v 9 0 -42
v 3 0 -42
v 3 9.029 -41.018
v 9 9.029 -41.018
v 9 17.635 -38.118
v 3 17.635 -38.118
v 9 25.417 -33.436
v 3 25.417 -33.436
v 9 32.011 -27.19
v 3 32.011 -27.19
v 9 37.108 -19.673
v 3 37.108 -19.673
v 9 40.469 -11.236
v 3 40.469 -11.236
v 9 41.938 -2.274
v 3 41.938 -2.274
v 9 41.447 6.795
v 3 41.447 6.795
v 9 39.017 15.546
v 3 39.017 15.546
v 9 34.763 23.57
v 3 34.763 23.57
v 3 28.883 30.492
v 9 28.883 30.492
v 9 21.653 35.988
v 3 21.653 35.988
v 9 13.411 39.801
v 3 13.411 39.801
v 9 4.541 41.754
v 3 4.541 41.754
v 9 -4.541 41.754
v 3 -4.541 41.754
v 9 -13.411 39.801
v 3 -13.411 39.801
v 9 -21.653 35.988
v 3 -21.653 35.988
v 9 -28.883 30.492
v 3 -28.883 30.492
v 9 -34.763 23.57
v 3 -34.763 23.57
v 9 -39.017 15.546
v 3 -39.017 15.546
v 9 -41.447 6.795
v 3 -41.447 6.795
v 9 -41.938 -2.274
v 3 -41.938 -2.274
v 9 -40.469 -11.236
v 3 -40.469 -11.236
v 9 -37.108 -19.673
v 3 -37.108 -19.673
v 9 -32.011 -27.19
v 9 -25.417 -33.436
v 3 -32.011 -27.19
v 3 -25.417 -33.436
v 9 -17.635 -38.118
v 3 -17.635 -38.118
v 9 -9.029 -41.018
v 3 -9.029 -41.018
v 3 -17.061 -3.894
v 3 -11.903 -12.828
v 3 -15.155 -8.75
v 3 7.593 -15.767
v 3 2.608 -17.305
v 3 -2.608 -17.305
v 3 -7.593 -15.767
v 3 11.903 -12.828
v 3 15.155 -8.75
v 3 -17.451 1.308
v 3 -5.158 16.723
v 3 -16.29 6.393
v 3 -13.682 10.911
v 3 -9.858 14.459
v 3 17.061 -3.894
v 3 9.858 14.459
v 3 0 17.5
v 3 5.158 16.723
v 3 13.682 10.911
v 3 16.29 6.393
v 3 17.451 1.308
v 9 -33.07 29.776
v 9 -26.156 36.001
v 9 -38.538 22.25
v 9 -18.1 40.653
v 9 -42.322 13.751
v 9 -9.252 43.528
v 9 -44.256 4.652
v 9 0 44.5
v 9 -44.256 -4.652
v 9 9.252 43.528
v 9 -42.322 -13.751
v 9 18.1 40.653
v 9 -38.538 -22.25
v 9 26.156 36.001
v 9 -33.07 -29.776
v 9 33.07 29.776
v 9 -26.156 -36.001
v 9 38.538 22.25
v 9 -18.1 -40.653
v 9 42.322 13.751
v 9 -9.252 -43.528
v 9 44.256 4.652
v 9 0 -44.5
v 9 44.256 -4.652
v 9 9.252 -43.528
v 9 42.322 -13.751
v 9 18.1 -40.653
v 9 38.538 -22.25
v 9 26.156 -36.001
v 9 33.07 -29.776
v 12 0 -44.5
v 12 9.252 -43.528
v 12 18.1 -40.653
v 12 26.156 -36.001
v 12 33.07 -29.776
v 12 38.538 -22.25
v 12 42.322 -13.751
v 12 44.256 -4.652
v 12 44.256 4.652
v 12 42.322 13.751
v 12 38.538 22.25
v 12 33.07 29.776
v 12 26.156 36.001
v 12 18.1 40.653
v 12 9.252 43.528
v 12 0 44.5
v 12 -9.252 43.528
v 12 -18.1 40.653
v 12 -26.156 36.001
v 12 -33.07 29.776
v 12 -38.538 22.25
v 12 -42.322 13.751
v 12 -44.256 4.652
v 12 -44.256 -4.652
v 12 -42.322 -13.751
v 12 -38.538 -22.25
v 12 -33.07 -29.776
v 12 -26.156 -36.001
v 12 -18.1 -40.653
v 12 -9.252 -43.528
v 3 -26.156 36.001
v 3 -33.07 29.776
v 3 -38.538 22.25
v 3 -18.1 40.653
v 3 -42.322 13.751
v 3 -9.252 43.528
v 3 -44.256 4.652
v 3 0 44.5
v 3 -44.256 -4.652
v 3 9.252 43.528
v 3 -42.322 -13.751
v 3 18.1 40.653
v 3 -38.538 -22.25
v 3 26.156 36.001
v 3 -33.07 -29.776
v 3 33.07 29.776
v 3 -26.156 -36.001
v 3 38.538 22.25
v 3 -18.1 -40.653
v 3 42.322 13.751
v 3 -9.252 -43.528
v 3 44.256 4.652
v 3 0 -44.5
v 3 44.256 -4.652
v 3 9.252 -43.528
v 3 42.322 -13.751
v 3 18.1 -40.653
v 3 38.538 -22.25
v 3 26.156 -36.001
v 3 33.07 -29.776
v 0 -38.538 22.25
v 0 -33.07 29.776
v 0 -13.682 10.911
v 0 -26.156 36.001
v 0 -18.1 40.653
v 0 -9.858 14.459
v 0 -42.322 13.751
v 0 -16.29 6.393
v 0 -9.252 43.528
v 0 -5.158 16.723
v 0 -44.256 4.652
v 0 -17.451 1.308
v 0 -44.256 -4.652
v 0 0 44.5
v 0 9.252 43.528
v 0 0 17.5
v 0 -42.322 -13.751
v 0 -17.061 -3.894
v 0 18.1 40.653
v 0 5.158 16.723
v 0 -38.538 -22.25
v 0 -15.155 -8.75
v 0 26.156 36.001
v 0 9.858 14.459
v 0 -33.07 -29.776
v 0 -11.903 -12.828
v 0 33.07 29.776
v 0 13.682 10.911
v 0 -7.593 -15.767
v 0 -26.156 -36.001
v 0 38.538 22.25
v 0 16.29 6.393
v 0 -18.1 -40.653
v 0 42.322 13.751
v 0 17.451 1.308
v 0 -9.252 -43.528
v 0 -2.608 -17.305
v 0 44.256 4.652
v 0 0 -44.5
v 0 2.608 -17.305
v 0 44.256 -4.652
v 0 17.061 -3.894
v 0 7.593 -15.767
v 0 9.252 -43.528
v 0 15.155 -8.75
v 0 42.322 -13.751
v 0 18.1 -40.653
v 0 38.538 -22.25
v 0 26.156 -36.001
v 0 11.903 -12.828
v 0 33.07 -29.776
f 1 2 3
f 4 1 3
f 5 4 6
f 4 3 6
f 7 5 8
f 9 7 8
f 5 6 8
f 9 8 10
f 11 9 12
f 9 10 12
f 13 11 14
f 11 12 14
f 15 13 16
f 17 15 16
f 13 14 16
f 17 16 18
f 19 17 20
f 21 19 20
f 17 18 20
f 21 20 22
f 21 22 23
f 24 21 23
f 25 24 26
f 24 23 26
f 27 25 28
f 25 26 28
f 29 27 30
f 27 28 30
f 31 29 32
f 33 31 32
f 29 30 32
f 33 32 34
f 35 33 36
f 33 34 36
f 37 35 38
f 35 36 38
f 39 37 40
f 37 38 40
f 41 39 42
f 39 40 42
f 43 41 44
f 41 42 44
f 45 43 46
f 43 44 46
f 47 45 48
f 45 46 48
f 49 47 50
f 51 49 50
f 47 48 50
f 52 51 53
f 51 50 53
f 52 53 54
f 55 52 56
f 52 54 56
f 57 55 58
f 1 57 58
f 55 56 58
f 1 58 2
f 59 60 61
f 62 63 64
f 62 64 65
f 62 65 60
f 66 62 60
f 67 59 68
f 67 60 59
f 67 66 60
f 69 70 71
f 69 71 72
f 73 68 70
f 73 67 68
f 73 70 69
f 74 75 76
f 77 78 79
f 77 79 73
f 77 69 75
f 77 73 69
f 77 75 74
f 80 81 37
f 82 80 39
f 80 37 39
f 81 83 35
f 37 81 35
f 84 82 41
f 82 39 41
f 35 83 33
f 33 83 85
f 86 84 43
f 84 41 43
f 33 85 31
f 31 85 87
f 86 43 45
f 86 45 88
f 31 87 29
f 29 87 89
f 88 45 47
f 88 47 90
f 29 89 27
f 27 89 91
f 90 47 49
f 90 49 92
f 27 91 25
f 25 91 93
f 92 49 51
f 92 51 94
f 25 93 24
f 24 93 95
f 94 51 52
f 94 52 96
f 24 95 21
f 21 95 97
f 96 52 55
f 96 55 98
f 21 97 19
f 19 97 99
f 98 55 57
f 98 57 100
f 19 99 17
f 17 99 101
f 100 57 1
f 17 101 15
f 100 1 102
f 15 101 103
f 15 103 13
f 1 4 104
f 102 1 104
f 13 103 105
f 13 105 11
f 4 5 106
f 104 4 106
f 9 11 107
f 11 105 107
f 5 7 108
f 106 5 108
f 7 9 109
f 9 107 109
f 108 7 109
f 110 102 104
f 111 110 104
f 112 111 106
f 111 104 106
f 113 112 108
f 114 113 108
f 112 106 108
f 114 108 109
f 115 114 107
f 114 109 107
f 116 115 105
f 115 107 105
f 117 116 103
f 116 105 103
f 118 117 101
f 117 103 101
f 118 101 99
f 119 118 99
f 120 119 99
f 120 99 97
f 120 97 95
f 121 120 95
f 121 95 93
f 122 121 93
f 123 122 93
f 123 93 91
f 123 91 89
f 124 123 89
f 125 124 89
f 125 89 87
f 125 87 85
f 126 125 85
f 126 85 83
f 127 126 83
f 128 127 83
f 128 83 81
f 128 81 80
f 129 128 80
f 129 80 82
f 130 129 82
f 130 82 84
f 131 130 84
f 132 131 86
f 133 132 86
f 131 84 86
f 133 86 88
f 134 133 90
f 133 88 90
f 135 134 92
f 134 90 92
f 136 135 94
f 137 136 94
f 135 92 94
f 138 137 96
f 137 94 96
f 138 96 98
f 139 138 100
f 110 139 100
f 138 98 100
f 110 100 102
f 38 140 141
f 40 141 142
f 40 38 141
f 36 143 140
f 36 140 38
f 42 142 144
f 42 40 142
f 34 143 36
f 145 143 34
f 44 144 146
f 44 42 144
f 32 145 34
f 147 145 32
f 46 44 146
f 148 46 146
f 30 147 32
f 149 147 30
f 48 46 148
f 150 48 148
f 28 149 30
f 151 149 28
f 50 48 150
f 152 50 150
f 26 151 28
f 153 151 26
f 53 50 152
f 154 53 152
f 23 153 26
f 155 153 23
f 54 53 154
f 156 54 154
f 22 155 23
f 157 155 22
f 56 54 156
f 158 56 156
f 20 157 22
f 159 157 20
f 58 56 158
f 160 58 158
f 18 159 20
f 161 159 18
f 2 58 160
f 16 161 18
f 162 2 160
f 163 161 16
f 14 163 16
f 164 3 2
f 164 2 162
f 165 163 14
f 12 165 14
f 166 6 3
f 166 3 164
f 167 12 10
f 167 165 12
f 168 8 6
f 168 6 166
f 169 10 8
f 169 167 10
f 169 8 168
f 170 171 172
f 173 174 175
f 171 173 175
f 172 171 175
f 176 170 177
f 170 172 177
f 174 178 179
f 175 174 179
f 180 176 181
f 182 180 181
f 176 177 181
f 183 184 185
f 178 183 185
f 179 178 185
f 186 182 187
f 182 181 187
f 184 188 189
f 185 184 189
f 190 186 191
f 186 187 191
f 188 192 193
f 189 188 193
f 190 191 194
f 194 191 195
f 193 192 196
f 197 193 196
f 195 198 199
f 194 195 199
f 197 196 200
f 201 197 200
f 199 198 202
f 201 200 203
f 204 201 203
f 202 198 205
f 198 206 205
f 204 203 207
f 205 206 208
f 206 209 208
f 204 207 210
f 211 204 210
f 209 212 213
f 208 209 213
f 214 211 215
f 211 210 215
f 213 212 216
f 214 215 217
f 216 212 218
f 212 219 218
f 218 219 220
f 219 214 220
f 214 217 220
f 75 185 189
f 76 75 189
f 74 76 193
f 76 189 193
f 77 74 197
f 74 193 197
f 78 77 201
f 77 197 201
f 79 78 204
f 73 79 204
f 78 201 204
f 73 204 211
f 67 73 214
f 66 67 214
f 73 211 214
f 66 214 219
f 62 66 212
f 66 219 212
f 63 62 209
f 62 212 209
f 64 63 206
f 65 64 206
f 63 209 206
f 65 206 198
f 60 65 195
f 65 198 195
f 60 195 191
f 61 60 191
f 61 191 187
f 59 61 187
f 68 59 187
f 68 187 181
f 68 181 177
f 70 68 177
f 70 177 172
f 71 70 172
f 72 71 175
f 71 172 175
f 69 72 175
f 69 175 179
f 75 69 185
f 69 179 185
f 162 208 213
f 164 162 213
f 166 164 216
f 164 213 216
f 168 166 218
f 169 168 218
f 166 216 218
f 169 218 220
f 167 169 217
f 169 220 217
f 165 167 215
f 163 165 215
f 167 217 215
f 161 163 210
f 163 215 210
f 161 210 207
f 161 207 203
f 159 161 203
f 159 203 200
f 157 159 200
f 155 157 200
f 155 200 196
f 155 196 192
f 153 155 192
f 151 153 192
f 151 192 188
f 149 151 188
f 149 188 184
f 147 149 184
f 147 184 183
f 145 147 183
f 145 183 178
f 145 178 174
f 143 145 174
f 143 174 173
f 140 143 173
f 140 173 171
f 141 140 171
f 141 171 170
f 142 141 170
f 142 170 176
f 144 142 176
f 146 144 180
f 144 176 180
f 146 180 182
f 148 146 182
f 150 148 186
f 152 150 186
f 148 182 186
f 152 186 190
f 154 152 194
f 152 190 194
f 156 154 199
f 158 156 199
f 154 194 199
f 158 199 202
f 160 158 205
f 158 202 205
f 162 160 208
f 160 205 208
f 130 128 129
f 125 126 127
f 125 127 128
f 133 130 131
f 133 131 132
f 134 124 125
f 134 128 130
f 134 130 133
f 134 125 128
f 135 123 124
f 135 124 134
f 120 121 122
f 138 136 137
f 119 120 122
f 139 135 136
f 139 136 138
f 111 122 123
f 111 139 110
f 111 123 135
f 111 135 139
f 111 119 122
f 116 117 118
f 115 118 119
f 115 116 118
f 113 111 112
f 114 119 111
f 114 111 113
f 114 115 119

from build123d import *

# Parameters (mm, degrees)
SKETCH1_R           = 44.5
BOSS_EXTRUDE1_DEPTH = 12
SKETCH3_R           = 44.5
SKETCH3_R_2         = 42
CUT_EXTRUDE1_DEPTH  = 6
SKETCH4_R           = 17.5
CUT_EXTRUDE2_DEPTH  = 3


with BuildPart() as part:
    # Sketch1 → Boss-Extrude1 (new body)
    with BuildSketch(Plane(origin=(0, 0, 0), x_dir=(0, 0, -1), z_dir=(1, 0, 0))):
        Circle(SKETCH1_R)
    extrude(amount=BOSS_EXTRUDE1_DEPTH)

    # Sketch3 → Cut-Extrude1 (cut)
    with BuildSketch(Plane(origin=(3, 0, 0), x_dir=(0, 0, -1), z_dir=(1, 0, 0))):
        Circle(SKETCH3_R)
        Circle(SKETCH3_R_2, mode=Mode.SUBTRACT)
    extrude(amount=CUT_EXTRUDE1_DEPTH, mode=Mode.SUBTRACT)

    # Sketch4 → Cut-Extrude2 (cut)
    with BuildSketch(Plane.ZY):
        Circle(SKETCH4_R)
    extrude(amount=-CUT_EXTRUDE2_DEPTH, mode=Mode.SUBTRACT)


solid = part.part
